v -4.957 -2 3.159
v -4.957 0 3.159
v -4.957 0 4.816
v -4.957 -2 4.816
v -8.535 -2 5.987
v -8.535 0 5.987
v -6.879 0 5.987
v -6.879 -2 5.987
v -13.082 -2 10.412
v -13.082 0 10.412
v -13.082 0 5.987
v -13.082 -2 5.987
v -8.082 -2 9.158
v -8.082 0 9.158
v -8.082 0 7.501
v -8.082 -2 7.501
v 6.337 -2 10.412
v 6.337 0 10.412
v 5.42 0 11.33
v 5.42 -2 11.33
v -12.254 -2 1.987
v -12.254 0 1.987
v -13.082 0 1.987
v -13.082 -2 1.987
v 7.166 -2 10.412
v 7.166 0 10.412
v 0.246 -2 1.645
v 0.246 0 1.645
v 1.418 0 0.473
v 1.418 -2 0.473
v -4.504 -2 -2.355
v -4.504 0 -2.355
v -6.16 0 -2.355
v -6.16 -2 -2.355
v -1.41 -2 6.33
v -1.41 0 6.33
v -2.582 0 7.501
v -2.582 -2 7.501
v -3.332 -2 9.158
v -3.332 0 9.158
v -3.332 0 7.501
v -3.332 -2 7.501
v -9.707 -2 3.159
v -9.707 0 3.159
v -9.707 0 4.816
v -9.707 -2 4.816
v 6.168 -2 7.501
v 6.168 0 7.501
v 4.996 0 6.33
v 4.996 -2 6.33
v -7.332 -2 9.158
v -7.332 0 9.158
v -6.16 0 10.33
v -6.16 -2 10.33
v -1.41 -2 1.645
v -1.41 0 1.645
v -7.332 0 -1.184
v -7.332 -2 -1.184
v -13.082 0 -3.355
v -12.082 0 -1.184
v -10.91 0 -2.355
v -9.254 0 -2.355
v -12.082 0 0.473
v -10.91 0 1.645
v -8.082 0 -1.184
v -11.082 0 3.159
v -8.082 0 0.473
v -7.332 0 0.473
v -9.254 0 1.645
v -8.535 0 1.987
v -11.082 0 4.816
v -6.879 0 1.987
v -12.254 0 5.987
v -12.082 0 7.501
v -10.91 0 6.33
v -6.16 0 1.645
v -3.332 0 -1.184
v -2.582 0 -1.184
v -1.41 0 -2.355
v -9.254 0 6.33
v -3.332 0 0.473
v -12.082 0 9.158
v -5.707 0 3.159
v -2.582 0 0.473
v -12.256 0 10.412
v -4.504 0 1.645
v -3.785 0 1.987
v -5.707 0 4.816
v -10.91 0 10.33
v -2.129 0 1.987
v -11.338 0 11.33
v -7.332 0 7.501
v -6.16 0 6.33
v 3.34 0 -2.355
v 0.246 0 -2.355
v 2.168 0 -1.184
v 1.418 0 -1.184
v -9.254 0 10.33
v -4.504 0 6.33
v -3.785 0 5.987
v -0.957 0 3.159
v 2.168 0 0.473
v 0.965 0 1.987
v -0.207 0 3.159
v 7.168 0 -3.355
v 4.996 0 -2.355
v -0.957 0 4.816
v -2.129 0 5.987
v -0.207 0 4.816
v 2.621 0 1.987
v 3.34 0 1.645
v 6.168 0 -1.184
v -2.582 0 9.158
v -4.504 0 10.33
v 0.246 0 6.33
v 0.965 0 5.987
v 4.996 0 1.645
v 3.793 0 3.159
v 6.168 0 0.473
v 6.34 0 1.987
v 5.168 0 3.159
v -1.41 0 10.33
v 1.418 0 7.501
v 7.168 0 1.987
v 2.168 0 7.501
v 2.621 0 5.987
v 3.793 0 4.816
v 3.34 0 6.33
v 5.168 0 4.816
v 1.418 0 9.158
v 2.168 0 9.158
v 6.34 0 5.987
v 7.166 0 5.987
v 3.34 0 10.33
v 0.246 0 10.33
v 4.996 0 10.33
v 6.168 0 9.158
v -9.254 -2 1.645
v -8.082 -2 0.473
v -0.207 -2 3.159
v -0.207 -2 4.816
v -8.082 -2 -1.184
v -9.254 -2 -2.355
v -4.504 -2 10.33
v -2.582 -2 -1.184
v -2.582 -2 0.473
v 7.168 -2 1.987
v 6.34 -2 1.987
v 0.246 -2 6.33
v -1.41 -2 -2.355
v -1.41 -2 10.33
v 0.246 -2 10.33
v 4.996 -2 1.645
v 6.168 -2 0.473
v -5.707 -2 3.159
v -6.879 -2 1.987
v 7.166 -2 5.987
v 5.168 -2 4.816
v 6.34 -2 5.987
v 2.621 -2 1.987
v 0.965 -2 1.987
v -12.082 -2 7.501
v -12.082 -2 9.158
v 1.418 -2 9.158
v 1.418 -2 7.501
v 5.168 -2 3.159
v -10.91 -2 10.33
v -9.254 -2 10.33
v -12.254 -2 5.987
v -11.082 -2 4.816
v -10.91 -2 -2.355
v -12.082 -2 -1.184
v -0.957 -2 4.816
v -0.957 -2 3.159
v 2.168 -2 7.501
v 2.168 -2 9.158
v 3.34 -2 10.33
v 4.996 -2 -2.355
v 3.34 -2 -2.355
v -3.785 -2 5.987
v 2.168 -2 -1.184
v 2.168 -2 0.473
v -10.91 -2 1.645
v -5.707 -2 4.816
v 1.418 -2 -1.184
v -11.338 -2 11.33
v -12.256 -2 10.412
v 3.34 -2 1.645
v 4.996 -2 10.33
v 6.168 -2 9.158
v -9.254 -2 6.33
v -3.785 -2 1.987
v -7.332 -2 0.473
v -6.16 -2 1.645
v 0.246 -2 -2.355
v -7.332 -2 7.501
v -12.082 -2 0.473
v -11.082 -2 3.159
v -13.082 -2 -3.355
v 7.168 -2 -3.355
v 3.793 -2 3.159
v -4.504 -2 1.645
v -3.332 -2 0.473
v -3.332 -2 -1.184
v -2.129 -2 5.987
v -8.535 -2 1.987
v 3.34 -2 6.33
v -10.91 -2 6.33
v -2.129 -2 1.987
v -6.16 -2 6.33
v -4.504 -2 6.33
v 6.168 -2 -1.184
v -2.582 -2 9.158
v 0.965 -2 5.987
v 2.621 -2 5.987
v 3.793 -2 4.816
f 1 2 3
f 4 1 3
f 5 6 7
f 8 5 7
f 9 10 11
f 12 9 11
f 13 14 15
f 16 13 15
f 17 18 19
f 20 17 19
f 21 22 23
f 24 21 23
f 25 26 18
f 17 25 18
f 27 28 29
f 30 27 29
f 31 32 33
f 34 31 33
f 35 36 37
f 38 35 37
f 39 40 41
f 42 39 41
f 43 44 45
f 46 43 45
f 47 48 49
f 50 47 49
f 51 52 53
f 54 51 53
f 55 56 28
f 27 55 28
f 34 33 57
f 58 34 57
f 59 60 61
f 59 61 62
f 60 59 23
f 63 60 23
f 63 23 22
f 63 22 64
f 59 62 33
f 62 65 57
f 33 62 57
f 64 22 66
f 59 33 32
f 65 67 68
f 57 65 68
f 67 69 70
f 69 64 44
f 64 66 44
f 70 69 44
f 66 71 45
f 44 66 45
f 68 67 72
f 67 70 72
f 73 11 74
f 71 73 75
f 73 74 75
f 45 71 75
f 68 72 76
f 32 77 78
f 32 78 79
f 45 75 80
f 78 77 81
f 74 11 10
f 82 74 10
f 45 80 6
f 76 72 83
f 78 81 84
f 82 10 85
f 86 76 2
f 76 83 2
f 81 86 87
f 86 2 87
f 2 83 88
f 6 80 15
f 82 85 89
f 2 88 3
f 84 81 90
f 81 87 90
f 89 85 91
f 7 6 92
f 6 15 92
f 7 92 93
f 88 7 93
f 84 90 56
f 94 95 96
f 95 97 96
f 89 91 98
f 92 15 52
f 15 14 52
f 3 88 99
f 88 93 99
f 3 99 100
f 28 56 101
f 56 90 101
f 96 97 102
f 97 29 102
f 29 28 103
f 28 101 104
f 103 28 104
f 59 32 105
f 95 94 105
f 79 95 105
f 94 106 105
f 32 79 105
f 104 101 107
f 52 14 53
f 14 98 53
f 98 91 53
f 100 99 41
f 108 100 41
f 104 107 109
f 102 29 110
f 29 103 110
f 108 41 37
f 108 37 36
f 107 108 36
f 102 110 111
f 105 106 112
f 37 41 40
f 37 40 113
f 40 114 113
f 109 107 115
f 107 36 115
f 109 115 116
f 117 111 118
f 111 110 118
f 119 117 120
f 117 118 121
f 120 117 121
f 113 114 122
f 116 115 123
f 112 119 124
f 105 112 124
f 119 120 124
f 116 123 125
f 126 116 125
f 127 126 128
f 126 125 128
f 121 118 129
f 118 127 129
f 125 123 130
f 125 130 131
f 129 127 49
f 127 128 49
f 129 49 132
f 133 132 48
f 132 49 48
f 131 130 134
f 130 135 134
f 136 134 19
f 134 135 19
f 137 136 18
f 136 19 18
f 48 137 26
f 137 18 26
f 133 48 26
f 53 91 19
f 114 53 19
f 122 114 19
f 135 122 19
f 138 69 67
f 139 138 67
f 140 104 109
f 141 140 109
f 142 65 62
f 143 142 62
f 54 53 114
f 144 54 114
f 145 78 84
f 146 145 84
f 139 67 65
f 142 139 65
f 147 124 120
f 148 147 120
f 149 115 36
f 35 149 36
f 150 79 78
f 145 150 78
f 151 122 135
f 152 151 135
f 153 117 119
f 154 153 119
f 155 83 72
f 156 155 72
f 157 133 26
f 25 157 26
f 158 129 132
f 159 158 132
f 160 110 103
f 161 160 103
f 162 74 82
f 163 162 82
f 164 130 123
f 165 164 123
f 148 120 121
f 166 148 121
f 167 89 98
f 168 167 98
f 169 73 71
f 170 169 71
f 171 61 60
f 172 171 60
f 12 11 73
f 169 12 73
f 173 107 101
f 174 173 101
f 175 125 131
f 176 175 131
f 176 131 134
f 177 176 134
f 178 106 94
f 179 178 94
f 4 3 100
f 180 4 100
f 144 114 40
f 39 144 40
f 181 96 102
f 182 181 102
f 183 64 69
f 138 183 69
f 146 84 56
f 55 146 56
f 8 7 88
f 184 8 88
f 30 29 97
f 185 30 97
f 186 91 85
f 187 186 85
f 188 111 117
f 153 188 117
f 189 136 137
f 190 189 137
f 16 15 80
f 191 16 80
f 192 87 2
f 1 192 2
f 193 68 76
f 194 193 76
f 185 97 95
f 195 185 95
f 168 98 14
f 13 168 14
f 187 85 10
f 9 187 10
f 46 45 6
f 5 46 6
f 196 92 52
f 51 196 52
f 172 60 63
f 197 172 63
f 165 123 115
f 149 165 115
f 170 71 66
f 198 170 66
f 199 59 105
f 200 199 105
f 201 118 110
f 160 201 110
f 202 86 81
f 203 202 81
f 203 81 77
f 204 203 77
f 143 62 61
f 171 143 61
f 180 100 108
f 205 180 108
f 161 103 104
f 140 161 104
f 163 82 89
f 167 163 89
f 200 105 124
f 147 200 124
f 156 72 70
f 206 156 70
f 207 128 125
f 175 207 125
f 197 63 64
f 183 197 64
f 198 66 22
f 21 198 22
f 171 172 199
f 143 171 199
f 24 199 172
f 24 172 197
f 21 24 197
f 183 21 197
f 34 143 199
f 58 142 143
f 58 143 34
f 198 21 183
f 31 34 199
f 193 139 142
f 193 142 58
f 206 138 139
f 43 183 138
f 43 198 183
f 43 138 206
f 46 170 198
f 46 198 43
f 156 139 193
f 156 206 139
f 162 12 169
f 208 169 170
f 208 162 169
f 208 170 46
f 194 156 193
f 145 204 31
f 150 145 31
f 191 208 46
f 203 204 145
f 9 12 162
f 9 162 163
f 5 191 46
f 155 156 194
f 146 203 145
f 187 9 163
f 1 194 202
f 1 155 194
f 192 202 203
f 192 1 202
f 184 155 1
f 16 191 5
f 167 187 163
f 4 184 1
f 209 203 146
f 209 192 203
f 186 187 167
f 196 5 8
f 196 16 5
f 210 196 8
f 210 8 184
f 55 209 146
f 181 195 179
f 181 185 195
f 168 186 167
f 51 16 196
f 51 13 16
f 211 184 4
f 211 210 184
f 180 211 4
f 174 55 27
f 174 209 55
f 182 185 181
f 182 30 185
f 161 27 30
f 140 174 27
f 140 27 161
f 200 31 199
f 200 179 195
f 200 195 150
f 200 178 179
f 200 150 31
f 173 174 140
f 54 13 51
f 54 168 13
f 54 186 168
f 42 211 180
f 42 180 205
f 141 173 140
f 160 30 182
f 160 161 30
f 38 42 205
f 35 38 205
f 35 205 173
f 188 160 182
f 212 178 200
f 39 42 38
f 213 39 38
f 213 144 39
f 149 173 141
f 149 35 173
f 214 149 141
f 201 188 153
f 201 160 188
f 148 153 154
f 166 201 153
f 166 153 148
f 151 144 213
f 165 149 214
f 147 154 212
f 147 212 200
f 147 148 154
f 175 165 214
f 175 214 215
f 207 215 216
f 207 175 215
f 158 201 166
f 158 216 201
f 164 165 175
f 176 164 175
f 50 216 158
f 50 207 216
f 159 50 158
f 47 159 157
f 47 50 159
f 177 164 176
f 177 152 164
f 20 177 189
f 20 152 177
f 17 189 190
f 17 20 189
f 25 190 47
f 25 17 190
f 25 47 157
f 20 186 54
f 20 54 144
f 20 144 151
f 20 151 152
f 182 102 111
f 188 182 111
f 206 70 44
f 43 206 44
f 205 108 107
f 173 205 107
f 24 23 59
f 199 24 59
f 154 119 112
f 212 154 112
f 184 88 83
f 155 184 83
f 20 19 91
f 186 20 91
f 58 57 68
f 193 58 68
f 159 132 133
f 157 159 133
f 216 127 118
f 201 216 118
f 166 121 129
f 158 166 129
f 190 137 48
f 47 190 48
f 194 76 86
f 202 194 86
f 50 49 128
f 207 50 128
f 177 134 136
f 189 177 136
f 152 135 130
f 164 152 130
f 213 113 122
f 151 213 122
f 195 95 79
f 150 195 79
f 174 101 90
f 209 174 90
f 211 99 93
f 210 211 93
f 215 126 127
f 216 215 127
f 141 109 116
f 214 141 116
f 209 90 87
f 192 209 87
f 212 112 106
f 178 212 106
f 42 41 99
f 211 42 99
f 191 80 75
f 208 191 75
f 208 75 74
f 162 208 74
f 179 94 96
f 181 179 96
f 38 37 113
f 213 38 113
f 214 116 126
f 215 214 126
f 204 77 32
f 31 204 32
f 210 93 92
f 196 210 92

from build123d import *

# Parameters (mm, degrees)
F1_DEPTH = 2


with BuildPart() as f1:
    # F0 (on Front) → F1 (new body)
    with BuildSketch(Plane.XZ):
        Polygon((5.419874, 11.329587), (-11.338243, 11.329587), (-12.255757, 10.412073), (-13.082057, 10.412073), (-13.082057, 5.987073), (-12.25363, 5.987073), (-11.082057, 4.8155), (-11.082057, 3.158646), (-12.25363, 1.987073), (-13.082057, 1.987073), (-13.082057, -3.355442), (7.167943, -3.355442), (7.167943, 1.987073), (6.339516, 1.987073), (5.167943, 3.158646), (5.167943, 4.8155), (6.339516, 5.987073), (7.165815, 5.987073), (7.165815, 10.412073), (6.337388, 10.412073), align=None)
        Polygon((-12.082057, -1.183869), (-12.082057, 0.472986), (-10.910484, 1.644558), (-9.25363, 1.644558), (-8.082057, 0.472986), (-8.082057, -1.183869), (-9.25363, -2.355442), (-10.910484, -2.355442), align=None, mode=Mode.SUBTRACT)
        Polygon((-4.50363, 1.644558), (-3.332057, 0.472986), (-3.332057, -1.183869), (-4.50363, -2.355442), (-6.160484, -2.355442), (-7.332057, -1.183869), (-7.332057, 0.472986), (-6.160484, 1.644558), align=None, mode=Mode.SUBTRACT)
        Polygon((-8.082057, 9.158014), (-8.082057, 7.50116), (-9.25363, 6.329587), (-10.910484, 6.329587), (-12.082057, 7.50116), (-12.082057, 9.158014), (-10.910484, 10.329587), (-9.25363, 10.329587), align=None, mode=Mode.SUBTRACT)
        Polygon((-9.707057, 3.158646), (-9.707057, 4.8155), (-8.535484, 5.987073), (-6.87863, 5.987073), (-5.707057, 4.8155), (-5.707057, 3.158646), (-6.87863, 1.987073), (-8.535484, 1.987073), align=None, mode=Mode.SUBTRACT)
        Polygon((-7.332057, 9.158014), (-6.160484, 10.329587), (-4.50363, 10.329587), (-3.332057, 9.158014), (-3.332057, 7.50116), (-4.50363, 6.329587), (-6.160484, 6.329587), (-7.332057, 7.50116), align=None, mode=Mode.SUBTRACT)
        Polygon((0.24637, 1.644558), (1.417943, 0.472986), (1.417943, -1.183869), (0.24637, -2.355442), (-1.410484, -2.355442), (-2.582057, -1.183869), (-2.582057, 0.472986), (-1.410484, 1.644558), align=None, mode=Mode.SUBTRACT)
        Polygon((4.99637, 1.644558), (6.167943, 0.472986), (6.167943, -1.183869), (4.99637, -2.355442), (3.339516, -2.355442), (2.167943, -1.183869), (2.167943, 0.472986), (3.339516, 1.644558), align=None, mode=Mode.SUBTRACT)
        Polygon((-3.785484, 5.987073), (-2.12863, 5.987073), (-0.957057, 4.8155), (-0.957057, 3.158646), (-2.12863, 1.987073), (-3.785484, 1.987073), (-4.957057, 3.158646), (-4.957057, 4.8155), align=None, mode=Mode.SUBTRACT)
        Polygon((0.964516, 5.987073), (2.62137, 5.987073), (3.792943, 4.8155), (3.792943, 3.158646), (2.62137, 1.987073), (0.964516, 1.987073), (-0.207057, 3.158646), (-0.207057, 4.8155), align=None, mode=Mode.SUBTRACT)
        Polygon((-2.582057, 9.158014), (-1.410484, 10.329587), (0.24637, 10.329587), (1.417943, 9.158014), (1.417943, 7.50116), (0.24637, 6.329587), (-1.410484, 6.329587), (-2.582057, 7.50116), align=None, mode=Mode.SUBTRACT)
        Polygon((2.167943, 9.158014), (3.339516, 10.329587), (4.99637, 10.329587), (6.167943, 9.158014), (6.167943, 7.50116), (4.99637, 6.329587), (3.339516, 6.329587), (2.167943, 7.50116), align=None, mode=Mode.SUBTRACT)
    extrude(amount=F1_DEPTH)


solid = f1.part
